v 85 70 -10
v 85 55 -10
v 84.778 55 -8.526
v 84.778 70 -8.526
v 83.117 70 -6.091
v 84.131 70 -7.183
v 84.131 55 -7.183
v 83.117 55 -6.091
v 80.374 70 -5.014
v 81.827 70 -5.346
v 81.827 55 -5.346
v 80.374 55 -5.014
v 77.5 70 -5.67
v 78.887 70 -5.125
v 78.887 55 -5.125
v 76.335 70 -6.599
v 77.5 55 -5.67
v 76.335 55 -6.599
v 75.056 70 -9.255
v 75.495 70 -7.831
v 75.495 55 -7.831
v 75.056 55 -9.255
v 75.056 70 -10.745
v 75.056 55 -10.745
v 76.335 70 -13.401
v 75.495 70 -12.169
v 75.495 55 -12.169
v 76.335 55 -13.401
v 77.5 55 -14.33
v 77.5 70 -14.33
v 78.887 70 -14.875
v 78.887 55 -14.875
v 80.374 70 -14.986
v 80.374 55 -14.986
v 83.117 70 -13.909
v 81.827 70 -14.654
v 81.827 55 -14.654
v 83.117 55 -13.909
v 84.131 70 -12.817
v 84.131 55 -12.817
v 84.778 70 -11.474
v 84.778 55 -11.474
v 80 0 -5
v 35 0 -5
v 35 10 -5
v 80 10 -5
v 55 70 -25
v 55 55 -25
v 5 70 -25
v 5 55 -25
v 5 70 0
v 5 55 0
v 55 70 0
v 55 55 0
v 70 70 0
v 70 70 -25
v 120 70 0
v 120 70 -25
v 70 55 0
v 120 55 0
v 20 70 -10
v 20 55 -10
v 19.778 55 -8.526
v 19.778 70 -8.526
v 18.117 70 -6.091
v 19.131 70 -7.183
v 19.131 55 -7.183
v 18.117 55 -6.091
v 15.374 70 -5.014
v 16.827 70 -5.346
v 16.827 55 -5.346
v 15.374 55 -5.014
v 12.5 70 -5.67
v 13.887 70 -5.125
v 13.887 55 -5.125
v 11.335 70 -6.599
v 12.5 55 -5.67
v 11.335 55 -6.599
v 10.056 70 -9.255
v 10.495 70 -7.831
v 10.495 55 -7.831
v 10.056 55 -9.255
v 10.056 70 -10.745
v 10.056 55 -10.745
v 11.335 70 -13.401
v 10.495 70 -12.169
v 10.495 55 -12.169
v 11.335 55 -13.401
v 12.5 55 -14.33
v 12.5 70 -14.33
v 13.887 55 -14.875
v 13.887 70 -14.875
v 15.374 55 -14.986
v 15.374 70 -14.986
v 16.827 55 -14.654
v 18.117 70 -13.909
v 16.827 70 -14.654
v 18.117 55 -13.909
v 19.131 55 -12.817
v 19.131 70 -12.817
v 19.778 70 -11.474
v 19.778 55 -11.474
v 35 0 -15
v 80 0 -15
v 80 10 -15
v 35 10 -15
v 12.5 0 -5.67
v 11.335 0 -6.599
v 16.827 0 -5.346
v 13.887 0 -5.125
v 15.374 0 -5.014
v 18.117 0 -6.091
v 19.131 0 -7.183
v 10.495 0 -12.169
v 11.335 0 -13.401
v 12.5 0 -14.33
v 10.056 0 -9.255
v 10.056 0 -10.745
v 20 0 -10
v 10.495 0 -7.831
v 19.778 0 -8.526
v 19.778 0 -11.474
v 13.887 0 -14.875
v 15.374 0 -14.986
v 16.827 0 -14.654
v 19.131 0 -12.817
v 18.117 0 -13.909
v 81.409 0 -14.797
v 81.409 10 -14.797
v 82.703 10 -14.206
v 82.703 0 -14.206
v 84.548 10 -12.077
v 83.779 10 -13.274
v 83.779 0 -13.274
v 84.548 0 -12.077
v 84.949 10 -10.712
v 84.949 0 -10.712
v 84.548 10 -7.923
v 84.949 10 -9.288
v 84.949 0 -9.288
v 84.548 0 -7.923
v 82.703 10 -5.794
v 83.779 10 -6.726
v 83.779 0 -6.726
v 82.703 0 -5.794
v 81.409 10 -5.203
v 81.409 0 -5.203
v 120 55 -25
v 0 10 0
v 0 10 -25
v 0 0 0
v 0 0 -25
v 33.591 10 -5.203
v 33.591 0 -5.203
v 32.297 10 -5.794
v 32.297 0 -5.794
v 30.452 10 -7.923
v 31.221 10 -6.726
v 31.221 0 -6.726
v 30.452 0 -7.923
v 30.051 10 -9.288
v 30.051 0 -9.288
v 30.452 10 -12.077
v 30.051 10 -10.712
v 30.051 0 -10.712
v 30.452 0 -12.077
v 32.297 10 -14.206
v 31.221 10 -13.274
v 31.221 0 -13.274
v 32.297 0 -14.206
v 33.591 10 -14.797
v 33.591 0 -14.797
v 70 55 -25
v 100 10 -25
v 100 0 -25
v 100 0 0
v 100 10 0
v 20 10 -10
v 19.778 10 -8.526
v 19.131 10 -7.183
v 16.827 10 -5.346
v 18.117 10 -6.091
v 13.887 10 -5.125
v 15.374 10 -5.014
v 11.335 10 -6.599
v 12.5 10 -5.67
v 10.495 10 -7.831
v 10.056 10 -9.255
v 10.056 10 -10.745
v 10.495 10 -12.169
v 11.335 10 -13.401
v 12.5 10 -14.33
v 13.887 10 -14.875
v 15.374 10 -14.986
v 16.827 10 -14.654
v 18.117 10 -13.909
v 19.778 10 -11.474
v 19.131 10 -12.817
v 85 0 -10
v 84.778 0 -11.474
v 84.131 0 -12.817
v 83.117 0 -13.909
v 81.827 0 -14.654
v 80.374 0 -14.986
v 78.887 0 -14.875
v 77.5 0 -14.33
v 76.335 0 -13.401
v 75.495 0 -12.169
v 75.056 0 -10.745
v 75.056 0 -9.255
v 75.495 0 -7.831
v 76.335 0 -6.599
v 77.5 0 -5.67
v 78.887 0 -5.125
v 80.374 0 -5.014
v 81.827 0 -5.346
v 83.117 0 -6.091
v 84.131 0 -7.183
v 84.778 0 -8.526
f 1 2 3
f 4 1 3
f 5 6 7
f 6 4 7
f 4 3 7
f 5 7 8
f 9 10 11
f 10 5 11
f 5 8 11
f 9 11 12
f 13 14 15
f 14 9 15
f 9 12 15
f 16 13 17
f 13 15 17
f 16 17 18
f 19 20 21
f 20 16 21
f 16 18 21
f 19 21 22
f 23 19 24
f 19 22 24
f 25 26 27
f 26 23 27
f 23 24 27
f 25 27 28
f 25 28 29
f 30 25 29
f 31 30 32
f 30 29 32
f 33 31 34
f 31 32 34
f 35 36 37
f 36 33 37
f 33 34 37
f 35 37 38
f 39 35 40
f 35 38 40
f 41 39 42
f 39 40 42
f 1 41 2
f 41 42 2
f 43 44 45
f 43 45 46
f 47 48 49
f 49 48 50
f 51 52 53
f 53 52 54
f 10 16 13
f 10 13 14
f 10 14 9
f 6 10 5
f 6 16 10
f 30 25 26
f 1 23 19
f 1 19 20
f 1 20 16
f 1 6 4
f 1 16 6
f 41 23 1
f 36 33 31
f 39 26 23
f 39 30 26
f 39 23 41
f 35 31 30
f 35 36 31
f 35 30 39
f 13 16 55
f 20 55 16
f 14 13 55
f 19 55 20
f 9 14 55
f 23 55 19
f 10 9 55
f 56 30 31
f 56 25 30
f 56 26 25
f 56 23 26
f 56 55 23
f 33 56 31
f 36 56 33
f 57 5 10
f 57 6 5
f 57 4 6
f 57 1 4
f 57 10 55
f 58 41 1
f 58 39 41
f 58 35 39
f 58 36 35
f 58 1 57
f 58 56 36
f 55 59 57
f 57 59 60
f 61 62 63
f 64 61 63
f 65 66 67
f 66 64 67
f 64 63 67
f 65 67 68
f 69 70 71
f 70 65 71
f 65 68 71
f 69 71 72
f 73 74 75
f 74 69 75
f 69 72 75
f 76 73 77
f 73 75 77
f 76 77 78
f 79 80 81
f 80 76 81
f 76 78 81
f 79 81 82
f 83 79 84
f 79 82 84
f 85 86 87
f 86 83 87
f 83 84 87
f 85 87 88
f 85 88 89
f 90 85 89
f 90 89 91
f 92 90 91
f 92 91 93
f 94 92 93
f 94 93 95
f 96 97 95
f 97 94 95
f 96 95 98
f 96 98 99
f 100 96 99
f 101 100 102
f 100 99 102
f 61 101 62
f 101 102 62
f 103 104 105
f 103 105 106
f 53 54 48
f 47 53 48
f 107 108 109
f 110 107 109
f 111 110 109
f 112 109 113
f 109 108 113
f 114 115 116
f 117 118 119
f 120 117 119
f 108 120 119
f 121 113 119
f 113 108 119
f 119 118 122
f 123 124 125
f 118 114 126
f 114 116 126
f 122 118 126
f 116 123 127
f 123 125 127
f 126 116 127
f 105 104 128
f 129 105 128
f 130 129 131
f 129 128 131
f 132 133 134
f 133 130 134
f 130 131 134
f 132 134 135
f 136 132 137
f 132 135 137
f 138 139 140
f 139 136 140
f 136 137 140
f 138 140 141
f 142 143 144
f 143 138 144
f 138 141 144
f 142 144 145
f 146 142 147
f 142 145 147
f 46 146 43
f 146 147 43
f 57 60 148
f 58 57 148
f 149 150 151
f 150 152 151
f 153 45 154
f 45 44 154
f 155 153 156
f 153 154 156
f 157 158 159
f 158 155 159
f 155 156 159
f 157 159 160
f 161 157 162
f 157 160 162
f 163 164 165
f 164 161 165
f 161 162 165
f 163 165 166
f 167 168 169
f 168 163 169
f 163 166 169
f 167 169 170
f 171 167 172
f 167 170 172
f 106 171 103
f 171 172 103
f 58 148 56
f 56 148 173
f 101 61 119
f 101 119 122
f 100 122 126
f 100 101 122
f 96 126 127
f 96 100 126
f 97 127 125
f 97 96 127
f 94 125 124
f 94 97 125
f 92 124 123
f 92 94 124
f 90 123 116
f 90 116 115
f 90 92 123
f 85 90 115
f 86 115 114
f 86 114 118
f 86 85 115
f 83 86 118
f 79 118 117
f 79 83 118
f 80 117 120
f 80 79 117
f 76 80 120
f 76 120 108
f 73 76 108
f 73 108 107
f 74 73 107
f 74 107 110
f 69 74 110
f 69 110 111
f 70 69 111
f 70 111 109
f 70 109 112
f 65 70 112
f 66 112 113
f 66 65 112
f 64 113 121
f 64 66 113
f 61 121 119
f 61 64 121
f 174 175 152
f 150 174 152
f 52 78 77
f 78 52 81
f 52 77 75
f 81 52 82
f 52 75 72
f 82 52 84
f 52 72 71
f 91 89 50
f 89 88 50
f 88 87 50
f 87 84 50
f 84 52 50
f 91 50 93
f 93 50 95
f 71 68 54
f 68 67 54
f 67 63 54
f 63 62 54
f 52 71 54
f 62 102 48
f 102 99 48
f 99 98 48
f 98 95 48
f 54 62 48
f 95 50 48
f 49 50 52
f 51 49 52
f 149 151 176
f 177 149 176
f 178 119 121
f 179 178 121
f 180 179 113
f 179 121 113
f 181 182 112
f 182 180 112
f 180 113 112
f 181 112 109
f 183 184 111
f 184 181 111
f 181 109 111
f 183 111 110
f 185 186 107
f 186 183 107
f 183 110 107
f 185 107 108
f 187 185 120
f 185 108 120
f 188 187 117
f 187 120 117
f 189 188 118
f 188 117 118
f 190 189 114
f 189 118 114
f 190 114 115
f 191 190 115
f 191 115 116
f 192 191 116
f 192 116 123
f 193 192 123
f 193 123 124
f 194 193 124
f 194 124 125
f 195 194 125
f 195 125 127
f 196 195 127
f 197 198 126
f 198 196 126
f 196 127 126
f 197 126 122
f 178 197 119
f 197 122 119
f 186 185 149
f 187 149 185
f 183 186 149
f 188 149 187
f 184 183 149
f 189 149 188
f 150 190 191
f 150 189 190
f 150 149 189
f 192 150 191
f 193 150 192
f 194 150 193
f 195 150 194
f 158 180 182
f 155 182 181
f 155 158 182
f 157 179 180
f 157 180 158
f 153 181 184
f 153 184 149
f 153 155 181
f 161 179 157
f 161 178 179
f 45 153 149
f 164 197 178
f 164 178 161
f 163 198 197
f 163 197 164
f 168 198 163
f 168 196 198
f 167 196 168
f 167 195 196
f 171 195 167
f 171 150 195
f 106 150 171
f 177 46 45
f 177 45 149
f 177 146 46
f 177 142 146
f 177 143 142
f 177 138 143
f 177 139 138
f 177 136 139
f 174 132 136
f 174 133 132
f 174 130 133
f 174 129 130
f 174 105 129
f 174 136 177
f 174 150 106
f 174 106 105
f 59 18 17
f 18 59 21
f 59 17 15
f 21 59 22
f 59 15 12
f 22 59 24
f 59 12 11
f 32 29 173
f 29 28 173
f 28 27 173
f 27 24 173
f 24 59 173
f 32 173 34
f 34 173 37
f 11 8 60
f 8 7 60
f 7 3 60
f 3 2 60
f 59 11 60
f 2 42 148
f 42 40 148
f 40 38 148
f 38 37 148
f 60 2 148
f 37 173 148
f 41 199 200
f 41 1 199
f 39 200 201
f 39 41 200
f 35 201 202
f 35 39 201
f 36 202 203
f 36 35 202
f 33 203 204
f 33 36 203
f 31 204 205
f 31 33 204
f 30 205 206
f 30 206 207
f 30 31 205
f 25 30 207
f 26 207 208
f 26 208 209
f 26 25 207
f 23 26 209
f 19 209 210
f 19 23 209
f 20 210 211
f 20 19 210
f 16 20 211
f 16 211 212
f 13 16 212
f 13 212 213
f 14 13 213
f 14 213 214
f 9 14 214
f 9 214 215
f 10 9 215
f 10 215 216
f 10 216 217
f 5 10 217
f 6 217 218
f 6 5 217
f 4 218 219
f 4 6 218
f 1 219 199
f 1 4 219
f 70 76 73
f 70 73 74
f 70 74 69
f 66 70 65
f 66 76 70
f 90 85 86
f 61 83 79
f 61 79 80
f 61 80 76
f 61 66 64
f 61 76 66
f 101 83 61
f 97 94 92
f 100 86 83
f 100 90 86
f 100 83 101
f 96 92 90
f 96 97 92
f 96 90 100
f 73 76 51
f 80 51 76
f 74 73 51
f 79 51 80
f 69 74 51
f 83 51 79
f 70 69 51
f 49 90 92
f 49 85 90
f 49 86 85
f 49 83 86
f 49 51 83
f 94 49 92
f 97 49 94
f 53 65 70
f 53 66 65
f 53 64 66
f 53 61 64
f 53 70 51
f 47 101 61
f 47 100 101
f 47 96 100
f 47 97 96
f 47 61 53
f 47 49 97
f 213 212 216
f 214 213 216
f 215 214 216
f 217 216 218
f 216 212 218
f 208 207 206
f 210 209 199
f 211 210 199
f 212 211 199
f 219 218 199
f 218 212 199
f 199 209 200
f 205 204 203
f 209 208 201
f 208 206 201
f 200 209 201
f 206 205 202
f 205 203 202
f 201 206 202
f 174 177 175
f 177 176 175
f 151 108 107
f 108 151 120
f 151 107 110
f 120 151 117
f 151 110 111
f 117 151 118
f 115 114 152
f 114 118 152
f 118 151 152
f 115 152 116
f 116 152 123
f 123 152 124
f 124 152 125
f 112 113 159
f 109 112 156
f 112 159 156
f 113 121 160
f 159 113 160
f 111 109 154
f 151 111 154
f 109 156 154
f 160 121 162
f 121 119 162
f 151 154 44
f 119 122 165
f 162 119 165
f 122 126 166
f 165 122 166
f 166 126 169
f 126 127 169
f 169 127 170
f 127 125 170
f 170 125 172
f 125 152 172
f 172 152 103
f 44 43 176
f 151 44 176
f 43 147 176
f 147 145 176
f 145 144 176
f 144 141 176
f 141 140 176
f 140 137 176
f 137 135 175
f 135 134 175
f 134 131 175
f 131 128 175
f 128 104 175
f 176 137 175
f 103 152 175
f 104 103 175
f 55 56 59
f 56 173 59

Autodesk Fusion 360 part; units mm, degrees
sketch "Sketch2" plane through (0, 0, 0) normal (0, 1, 0) x (1, 0, 0) in component "bar"
  line L0 (0, 0) -> (100, 0)
  line L1 (100, 0) -> (100, 25)
  line L2 (100, 25) -> (0, 25)
  line L3 (0, 25) -> (0, 0)
  circle A0 centre (15, 10) radius 5
  line L4 (35, 5) -> (80, 5)
  arc A1 (80, 5) -> (80, 15) centre (80, 10) ccw
  line L5 (80, 15) -> (35, 15)
  arc A2 (35, 15) -> (35, 5) centre (35, 10) ccw
  line L6 (35, 10) -> (80, 10) construction
  dimension "d9" = 0
  dimension "d10" = 0
  dimension "d11" = 0
  dimension "d12" = 0
extrude "Extrude1" add sketch "Sketch2" along normal blind 10 makes body 1 in component "bar"
sketch "Sketch1" plane through (0, 0, 0) normal (0, 1, 0) x (1, 0, 0) in component "rod"
  circle A0 centre (-50, -50) radius 5
  dimension "d5" = 0
  dimension "d6" = 0
  dimension "d7" = 0
  dimension "d8" = 0
  dimension "d43" = 0
  dimension "d44" = 0
  dimension "d45" = 0
  dimension "d46" = 0
extrude "Extrude1'" add sketch "Sketch1" against normal blind 70 separate body makes body 2 in component "rod"
sketch "Sketch1 (2)" plane through (0, 0, 0) normal (0, 1, 0) x (1, 0, 0) in component "truck"
  line L0 (-50, -50) -> (0, -50)
  line L1 (0, -50) -> (0, -25)
  line L2 (0, -25) -> (-50, -25)
  line L3 (-50, -25) -> (-50, -50)
  circle A0 centre (-40, -40) radius 5
  dimension "d39" = 0
  dimension "d40" = 0
  dimension "d41" = 0
  dimension "d42" = 0
extrude "Extrude1''" add sketch "Sketch1 (2)" along normal blind 15 separate body makes body 3 in component "truck"
component "bar" placed x (1, 0, 0) y (0, 1, 0) z (0, 0, 1) at (0, 0, 0)
component "rod" placed x (1, 0, 0) y (0, 1, 0) z (0, 0, 1) at (65, 70, -60)
component "rod" placed x (1, 0, 0) y (0, 1, 0) z (0, 0, 1) at (130, 70, -60)
component "truck" placed x (1, 0, 0) y (0, 1, 0) z (0, 0, 1) at (55, 55, -50)
component "truck" placed x (1, 0, 0) y (0, 1, 0) z (0, 0, 1) at (120, 55, -50)
